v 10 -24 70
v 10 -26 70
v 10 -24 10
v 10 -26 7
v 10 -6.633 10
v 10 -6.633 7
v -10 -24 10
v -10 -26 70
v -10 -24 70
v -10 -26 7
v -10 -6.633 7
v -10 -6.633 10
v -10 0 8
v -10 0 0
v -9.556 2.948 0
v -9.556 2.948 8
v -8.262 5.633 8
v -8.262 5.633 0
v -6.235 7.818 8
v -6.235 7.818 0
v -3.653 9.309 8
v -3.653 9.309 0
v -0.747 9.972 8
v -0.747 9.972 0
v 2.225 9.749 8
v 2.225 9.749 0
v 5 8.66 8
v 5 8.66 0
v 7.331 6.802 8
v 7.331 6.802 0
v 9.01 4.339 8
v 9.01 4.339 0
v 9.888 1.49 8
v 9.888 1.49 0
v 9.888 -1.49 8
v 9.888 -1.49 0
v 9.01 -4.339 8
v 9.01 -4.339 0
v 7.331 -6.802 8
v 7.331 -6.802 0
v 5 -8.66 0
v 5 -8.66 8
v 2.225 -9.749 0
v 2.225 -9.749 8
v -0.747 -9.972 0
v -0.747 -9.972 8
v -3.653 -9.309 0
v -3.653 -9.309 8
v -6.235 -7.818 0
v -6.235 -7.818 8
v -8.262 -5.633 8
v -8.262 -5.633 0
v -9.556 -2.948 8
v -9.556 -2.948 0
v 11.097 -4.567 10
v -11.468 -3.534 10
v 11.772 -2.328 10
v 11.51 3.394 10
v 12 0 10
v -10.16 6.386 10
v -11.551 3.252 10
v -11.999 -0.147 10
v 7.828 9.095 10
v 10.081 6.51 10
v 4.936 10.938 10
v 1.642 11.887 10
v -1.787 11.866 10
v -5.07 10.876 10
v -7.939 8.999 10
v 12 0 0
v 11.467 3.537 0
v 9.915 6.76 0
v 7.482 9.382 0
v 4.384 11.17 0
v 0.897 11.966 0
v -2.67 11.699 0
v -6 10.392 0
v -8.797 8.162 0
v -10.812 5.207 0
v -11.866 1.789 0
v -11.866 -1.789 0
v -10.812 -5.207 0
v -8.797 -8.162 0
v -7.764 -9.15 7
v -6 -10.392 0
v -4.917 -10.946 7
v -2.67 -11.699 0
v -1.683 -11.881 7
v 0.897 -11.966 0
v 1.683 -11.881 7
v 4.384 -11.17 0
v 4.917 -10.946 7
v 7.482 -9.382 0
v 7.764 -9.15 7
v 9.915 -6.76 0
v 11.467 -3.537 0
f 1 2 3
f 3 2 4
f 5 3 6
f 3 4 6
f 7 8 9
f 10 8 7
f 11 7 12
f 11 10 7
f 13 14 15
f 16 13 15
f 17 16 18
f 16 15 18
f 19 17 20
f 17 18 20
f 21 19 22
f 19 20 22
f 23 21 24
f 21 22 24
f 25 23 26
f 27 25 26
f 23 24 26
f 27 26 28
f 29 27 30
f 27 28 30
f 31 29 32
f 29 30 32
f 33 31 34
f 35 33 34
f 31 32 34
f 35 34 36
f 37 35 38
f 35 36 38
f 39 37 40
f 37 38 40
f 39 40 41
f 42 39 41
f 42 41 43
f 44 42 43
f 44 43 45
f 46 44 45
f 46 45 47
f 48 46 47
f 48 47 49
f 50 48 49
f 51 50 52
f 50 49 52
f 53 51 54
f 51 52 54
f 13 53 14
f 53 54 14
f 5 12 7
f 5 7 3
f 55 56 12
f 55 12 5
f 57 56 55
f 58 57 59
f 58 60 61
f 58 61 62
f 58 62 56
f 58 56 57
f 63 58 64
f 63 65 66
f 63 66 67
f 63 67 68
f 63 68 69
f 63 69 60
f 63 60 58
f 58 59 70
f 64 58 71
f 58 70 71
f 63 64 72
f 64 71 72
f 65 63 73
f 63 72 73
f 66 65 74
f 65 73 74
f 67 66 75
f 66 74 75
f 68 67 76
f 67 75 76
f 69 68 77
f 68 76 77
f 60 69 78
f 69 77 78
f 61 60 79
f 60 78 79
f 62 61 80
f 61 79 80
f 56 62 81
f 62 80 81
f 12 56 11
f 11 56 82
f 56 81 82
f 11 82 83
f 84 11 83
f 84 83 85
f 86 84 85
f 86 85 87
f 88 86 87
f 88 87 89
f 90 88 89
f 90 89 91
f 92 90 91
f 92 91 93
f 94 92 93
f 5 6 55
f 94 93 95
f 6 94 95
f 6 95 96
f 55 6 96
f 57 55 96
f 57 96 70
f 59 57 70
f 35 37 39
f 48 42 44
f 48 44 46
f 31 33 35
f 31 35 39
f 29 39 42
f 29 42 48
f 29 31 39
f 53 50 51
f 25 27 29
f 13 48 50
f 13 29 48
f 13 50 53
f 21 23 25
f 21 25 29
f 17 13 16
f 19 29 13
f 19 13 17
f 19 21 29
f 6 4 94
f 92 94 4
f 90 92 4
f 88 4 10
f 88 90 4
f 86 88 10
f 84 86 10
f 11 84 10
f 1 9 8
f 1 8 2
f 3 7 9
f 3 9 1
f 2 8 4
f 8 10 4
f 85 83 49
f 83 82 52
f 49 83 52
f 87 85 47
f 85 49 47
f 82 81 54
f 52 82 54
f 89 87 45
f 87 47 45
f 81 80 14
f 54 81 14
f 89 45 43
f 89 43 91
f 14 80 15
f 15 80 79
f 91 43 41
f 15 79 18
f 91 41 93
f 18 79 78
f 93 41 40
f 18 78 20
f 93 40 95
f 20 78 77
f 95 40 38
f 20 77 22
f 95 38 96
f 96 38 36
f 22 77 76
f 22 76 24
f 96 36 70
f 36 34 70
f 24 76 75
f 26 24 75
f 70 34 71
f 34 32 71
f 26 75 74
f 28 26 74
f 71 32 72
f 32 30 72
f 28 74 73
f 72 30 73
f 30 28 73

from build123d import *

# Parameters (mm, degrees)
SKETCH2_R           = 12
BOSS_EXTRUDE1_DEPTH = 10
BOSS_EXTRUDE2_DEPTH = 3
SKETCH4_W           = 20
SKETCH4_H           = 2
BOSS_EXTRUDE3_DEPTH = 60
SKETCH5_R           = 10
CUT_EXTRUDE1_DEPTH  = 8


with BuildPart() as part:
    # Sketch2 → Boss-Extrude1 (new body)
    with BuildSketch(Plane.XY):
        Circle(SKETCH2_R)
    extrude(amount=BOSS_EXTRUDE1_DEPTH)

    # Sketch3 → Boss-Extrude2 (add)
    with BuildSketch(Plane.XY.offset(10)):
        with BuildLine():
            Line((-10, -26), (-10, -6.633249581))
            ThreePointArc((-10, -6.633249581), (0, -12), (10, -6.633249581))
            Line((10, -6.633249581), (10, -26))
            Line((10, -26), (-10, -26))
        make_face()
    extrude(amount=-BOSS_EXTRUDE2_DEPTH)

    # Sketch4 → Boss-Extrude3 (add)
    with BuildSketch(Plane.XY.offset(10)):
        with Locations((0, -25)):
            Rectangle(SKETCH4_W, SKETCH4_H)
    extrude(amount=BOSS_EXTRUDE3_DEPTH)

    # Sketch5 → Cut-Extrude1 (cut)
    with BuildSketch(Plane(origin=(0, 0, 0), x_dir=(-1, 0, 0), z_dir=(0, 0, -1))):
        Circle(SKETCH5_R)
    extrude(amount=-CUT_EXTRUDE1_DEPTH, mode=Mode.SUBTRACT)


solid = part.part
